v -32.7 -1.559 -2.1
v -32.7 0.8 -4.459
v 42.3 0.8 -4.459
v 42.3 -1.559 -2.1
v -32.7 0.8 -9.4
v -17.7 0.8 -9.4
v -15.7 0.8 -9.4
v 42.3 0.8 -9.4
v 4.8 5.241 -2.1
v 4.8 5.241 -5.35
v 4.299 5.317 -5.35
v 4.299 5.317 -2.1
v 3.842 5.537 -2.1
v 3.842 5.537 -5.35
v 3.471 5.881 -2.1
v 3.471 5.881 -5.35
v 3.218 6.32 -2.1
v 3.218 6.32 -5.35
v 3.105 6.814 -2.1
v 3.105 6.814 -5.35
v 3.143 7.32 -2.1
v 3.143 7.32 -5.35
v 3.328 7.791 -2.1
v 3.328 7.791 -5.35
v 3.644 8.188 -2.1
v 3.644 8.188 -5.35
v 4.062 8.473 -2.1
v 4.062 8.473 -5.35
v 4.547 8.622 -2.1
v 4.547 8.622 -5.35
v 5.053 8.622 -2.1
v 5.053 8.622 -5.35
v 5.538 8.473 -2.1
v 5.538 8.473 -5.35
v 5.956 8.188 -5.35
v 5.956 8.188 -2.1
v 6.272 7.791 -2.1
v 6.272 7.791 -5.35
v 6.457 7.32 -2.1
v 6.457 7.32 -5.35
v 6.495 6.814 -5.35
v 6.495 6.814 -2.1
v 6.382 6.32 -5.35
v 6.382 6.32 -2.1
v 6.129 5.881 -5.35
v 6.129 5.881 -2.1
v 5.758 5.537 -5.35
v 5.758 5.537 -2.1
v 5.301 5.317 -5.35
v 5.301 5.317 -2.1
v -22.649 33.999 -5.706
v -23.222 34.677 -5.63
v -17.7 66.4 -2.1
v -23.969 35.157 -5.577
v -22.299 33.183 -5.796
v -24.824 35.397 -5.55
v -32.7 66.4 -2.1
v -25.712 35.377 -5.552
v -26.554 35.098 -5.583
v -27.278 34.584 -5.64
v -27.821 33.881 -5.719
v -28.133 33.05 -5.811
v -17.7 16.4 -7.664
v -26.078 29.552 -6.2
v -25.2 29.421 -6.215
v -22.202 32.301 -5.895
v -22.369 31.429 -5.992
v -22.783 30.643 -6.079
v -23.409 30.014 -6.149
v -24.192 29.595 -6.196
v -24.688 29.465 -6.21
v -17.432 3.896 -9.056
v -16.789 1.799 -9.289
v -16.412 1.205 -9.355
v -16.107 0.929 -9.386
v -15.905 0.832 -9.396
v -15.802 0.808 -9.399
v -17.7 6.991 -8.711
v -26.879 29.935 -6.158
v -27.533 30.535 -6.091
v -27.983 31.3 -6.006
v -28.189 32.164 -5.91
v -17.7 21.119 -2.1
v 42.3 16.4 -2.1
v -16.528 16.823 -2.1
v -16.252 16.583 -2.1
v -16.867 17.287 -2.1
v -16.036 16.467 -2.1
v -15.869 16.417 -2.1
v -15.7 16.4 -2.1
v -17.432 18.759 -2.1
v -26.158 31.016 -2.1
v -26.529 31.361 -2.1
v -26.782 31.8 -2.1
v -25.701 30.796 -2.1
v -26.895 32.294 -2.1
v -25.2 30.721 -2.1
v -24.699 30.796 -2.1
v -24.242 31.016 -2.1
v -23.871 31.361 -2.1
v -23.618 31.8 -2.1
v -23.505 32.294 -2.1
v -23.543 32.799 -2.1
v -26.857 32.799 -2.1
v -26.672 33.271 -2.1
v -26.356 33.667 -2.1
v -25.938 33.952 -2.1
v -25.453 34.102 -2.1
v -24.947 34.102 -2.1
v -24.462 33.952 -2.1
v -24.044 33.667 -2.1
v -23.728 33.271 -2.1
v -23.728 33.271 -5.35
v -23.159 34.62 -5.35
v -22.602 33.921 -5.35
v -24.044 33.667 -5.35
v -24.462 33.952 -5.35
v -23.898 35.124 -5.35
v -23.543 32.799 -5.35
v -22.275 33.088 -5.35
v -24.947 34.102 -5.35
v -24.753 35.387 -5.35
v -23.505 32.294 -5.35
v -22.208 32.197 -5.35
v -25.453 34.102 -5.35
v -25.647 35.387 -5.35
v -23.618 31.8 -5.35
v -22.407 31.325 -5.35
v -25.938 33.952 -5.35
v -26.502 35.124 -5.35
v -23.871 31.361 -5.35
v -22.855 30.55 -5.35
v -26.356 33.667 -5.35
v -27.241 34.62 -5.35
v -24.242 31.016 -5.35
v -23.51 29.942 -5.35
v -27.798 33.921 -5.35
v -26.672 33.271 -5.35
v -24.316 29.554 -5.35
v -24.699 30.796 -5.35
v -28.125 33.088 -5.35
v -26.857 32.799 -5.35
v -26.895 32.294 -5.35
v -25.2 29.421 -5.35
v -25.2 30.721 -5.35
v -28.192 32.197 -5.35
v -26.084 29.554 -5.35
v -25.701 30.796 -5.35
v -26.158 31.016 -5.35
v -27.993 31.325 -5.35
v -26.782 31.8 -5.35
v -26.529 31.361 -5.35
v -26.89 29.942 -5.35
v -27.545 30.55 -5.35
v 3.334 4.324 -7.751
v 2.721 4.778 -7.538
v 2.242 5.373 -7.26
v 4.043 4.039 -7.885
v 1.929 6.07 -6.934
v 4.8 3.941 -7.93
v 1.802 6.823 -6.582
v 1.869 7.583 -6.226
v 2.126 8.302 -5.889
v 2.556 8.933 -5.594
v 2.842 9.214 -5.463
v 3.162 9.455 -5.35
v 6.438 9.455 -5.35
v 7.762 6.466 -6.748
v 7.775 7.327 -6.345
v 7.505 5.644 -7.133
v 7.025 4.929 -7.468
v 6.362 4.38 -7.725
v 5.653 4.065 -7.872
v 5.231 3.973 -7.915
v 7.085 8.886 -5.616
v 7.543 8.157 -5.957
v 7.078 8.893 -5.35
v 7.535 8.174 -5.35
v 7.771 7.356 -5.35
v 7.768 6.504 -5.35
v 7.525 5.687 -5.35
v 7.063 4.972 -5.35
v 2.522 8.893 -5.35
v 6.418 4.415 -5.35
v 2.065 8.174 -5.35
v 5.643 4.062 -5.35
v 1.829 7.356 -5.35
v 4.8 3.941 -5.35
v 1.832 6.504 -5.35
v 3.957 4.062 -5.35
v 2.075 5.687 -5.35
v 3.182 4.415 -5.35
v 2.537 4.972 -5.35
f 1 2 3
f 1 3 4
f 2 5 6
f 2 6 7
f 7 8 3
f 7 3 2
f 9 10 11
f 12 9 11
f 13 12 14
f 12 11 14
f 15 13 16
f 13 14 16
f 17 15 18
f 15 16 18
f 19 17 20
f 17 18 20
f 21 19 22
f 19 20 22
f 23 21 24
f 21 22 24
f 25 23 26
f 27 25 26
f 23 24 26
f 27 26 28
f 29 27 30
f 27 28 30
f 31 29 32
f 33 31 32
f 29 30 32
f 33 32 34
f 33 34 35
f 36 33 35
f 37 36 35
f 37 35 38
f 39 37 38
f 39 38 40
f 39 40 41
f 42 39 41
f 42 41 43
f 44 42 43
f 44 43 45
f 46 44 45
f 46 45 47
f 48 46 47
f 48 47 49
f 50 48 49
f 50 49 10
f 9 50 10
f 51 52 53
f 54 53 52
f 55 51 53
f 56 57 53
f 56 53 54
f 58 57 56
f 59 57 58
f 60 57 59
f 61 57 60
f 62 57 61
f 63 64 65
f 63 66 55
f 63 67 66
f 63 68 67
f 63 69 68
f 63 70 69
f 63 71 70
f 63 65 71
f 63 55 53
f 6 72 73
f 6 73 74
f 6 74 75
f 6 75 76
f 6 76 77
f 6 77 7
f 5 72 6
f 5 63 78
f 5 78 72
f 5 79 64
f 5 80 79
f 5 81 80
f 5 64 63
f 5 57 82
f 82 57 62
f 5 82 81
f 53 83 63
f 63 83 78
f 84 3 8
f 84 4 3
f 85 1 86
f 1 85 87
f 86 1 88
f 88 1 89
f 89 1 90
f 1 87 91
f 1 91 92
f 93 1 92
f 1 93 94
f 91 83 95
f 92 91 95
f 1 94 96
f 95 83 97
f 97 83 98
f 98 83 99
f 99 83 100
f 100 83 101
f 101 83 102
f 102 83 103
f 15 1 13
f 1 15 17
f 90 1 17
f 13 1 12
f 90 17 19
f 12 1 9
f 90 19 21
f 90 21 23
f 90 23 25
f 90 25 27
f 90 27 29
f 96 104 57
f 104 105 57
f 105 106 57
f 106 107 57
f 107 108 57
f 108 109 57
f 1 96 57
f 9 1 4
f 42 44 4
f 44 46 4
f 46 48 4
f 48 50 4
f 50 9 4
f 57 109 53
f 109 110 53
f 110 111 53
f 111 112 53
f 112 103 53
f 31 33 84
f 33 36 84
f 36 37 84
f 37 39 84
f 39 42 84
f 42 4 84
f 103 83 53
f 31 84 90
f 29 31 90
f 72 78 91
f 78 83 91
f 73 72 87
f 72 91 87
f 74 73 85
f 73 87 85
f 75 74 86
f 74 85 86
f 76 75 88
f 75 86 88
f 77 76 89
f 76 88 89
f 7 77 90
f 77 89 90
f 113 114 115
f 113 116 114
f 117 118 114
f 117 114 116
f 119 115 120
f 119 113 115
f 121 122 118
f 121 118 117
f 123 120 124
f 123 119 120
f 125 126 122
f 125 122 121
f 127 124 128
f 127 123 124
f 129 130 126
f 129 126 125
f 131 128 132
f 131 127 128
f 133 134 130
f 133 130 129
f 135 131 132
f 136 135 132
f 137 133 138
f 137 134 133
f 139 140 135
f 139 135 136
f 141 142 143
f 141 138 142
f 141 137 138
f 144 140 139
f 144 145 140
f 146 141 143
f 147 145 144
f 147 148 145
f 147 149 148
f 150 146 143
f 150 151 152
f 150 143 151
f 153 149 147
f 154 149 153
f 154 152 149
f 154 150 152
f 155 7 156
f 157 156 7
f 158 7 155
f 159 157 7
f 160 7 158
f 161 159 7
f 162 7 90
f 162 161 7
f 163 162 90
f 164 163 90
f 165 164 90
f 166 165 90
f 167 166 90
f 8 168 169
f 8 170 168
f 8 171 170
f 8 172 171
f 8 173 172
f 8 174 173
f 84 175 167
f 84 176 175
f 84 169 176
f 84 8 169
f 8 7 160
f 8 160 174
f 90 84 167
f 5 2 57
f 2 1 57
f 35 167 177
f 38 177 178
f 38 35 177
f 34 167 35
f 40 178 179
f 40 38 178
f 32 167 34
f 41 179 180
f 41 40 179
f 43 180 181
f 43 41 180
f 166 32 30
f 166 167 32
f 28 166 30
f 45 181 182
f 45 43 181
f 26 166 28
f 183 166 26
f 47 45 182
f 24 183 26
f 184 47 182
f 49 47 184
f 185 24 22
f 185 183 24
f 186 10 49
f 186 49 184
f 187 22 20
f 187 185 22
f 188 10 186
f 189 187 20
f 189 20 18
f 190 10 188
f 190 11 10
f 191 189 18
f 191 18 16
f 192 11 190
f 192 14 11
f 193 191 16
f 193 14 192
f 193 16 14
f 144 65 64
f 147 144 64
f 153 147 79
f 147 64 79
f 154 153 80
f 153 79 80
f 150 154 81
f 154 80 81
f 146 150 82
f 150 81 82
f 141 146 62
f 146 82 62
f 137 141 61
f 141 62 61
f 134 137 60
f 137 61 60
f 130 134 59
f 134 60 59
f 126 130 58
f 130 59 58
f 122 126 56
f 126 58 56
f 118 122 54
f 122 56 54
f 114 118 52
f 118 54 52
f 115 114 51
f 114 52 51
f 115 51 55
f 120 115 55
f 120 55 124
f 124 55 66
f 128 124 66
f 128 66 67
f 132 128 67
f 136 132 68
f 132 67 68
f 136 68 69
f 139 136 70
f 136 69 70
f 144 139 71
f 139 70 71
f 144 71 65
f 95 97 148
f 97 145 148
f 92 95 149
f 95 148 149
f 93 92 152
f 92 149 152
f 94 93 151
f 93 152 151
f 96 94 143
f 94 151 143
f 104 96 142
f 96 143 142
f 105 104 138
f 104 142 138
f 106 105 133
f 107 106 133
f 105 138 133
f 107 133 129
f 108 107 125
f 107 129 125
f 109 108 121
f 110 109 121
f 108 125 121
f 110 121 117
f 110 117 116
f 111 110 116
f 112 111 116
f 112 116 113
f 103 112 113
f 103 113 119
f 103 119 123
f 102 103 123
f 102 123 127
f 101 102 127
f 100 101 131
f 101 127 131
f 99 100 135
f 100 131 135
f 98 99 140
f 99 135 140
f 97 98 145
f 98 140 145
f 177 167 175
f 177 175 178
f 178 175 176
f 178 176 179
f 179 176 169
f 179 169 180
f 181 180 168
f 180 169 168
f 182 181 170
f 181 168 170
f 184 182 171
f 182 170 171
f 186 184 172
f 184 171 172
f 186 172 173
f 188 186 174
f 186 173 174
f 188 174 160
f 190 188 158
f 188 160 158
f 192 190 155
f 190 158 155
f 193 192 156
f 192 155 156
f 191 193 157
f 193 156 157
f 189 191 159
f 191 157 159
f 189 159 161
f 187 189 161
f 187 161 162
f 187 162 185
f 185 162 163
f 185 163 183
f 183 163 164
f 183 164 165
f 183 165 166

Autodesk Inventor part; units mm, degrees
ref_plane "YZ Plane" through (0, 0, 0) normal (1, 0, 0) x (0, 1, 0)
ref_plane "XZ Plane" through (0, 0, 0) normal (0, 1, 0) x (-1, 0, 0)
ref_plane "XY Plane" through (0, 0, 0) normal (0, 0, 1) x (1, 0, 0)
ref_plane "Work Plane3" through (42.3, -5.3, -4.5) normal (1, 0, 0) x (0, 1, 0)
sketch "Sketch3" plane through (42.3, -5.3, -4.5) normal (1, 0, 0) x (0, 1, 0)
  line L0 (3.5, 2.5) -> (6, 0) projected
  line L1 (6, -5) -> (6, 0) projected
  line L2 (3.5, 2.5) -> (21.8, 2.5)
  line L3 (6, -5) -> (21.8, -5)
  line L4 (21.8, -5) -> (21.8, 2.5)
  line L5 (21.7, 2.4) -> (21.7, -4.9)
  line L6 (21.7, -4.9) -> (6.1, -4.9)
  line L7 (6.1, -4.9) -> (6.1, 0.0414)
  line L8 (6.1, 0.0414) -> (3.7414, 2.4)
  line L9 (3.7414, 2.4) -> (21.7, 2.4)
  point P0 (21.7, 2.4)
  dimension "d0" = 0.1
  dimension "d36" = 15.8
  dimension "d37" = 7.3
  dimension "d38" = 15.7
  dimension "d39" = 15.7
  dimension "d40" = 12.7986
extrude "Extrusion1" add sketch "Sketch3" against normal blind 75 contours L5 L6 L7 L8 L9
sketch "Sketch4" plane through (42.3, 16.4, -2.1) normal (0, 1, 0) x (1, 0, 0)
  line L0 (-60, -0.1) -> (-75, -0.1) projected
  line L1 (-75, -0.1) -> (-75, -7.1) projected
  line L2 (-60, 0) -> (-75, 0)
  line L3 (-75, 7.3) -> (-60, 7.3)
  arc A0 (-75, -7.1) -> (-70, -12.1) centre (-70, -7.1) ccw projected
  line L4 (-60, -12.1) -> (-70, -12.1) projected
  line L5 (-60, -0.1) -> (-60, -8.7171) projected
  line L6 (-60, -10.4829) -> (-60, -12.1) projected
  line L7 (-60, -10.4829) -> (-63.5, -11.1) projected
  line L8 (-63.5, -11.1) -> (-63.5, -8.1) projected
  line L9 (-63.5, -8.1) -> (-60, -8.7171) projected
  line L10 (-60, 0) -> (-60, 7.3)
  line L11 (-75, 0) -> (-75, 7.3)
  dimension "d41" = 15
extrude "Extrusion2" add sketch "Sketch4" along normal blind 50 contours L2 L11 L3 L10
sketch "Sketch5" plane through (-32.7, -5.3, -4.5) normal (-1, 0, 0) x (0, 0, 1)
  line L0 (2.4, 3.7414) -> (2.4, 71.7) projected
  line L1 (2.4, 71.7) -> (2.4, 3.7414)
  line L2 (-4.9, 6.1) -> (0.0414, 6.1) projected
  line L3 (2.4, 3.7414) -> (0.0414, 6.1)
  line L4 (0.0414, 6.1) -> (-4.9, 6.1)
  line L5 (2.4, 71.7) -> (-4.9, 6.1)
  line L6 (2.4, 71.7) -> (-4.9, 71.7)
  line L7 (-4.9, 71.7) -> (-4.9, 6.1)
extrude "Extrusion3" cut sketch "Sketch5" against normal through all contours L5 L7 L6
sketch "Sketch6" plane through (42.3, -5.3, -4.5) normal (1, 0, 0) x (0, 0, -1)
  line L0 (3.164, 21.7) -> (-2.4, 71.7) projected
  line L1 (4.9, 6.1) -> (3.164, 21.7)
  line L2 (3.164, 21.7) -> (-2.4, 21.7)
  line L3 (-2.4, 3.7414) -> (-2.4, 71.7) projected
  line L4 (4.9, 6.1) -> (-2.4, 21.7)
extrude "Extrusion4" cut sketch "Sketch6" against normal blind 60 contours L1 L4 L2
sketch "Sketch7" plane through (-32.7, -1.5586, -2.1) normal (0, 0, 1) x (1, 0, 0)
  line L0 (75, 0) -> (0, 0) projected
  line L1 (0, 0) -> (0, 67.9586) projected
  line L2 (0, 67.9586) -> (15, 67.9586) projected
  line L3 (15, 17.9586) -> (15, 67.9586) projected
  point P0 (32.7, 1.5586)
  point P1 (37.5, 8.5)
  point P2 (7.5, 33.9793)
  point P3 (15, 22.6774)
  dimension "d10" = 37.5
  dimension "d11" = 8.5
  dimension "d12" = 7.5
  dimension "d13" = 33.9793
hole "Hole1" at (4.8, 6.9414, -2.1) at (-25.2, 32.4207, -2.1) direction (0, 0, -1) diameter 3.4 end through all clearance for "Flat Head Machine Screw" size "M3" standard "Ansi Metric M Profile"
ref_plane "Work Plane4" through (-32.7, -1.5586, -5.35) normal (0, 0, 1) x (1, 0, 0)
sketch "Sketch10" plane through (-32.7, -1.5586, -5.35) normal (0, 0, 1) x (1, 0, 0)
  point P0 (32.7, 1.5586)
  point P1 (37.5, 8.5)
  point P2 (7.5, 33.9793)
hole "Hole2" at (4.8, 6.9414, -5.35) at (-25.2, 32.4207, -5.35) direction (0, 0, -1) diameter 6 end through all
fillet "Fillet2" radius 2 1 edges at (-17.7, 8.6, -5.75)
properties part number "Base Gripper Support"
